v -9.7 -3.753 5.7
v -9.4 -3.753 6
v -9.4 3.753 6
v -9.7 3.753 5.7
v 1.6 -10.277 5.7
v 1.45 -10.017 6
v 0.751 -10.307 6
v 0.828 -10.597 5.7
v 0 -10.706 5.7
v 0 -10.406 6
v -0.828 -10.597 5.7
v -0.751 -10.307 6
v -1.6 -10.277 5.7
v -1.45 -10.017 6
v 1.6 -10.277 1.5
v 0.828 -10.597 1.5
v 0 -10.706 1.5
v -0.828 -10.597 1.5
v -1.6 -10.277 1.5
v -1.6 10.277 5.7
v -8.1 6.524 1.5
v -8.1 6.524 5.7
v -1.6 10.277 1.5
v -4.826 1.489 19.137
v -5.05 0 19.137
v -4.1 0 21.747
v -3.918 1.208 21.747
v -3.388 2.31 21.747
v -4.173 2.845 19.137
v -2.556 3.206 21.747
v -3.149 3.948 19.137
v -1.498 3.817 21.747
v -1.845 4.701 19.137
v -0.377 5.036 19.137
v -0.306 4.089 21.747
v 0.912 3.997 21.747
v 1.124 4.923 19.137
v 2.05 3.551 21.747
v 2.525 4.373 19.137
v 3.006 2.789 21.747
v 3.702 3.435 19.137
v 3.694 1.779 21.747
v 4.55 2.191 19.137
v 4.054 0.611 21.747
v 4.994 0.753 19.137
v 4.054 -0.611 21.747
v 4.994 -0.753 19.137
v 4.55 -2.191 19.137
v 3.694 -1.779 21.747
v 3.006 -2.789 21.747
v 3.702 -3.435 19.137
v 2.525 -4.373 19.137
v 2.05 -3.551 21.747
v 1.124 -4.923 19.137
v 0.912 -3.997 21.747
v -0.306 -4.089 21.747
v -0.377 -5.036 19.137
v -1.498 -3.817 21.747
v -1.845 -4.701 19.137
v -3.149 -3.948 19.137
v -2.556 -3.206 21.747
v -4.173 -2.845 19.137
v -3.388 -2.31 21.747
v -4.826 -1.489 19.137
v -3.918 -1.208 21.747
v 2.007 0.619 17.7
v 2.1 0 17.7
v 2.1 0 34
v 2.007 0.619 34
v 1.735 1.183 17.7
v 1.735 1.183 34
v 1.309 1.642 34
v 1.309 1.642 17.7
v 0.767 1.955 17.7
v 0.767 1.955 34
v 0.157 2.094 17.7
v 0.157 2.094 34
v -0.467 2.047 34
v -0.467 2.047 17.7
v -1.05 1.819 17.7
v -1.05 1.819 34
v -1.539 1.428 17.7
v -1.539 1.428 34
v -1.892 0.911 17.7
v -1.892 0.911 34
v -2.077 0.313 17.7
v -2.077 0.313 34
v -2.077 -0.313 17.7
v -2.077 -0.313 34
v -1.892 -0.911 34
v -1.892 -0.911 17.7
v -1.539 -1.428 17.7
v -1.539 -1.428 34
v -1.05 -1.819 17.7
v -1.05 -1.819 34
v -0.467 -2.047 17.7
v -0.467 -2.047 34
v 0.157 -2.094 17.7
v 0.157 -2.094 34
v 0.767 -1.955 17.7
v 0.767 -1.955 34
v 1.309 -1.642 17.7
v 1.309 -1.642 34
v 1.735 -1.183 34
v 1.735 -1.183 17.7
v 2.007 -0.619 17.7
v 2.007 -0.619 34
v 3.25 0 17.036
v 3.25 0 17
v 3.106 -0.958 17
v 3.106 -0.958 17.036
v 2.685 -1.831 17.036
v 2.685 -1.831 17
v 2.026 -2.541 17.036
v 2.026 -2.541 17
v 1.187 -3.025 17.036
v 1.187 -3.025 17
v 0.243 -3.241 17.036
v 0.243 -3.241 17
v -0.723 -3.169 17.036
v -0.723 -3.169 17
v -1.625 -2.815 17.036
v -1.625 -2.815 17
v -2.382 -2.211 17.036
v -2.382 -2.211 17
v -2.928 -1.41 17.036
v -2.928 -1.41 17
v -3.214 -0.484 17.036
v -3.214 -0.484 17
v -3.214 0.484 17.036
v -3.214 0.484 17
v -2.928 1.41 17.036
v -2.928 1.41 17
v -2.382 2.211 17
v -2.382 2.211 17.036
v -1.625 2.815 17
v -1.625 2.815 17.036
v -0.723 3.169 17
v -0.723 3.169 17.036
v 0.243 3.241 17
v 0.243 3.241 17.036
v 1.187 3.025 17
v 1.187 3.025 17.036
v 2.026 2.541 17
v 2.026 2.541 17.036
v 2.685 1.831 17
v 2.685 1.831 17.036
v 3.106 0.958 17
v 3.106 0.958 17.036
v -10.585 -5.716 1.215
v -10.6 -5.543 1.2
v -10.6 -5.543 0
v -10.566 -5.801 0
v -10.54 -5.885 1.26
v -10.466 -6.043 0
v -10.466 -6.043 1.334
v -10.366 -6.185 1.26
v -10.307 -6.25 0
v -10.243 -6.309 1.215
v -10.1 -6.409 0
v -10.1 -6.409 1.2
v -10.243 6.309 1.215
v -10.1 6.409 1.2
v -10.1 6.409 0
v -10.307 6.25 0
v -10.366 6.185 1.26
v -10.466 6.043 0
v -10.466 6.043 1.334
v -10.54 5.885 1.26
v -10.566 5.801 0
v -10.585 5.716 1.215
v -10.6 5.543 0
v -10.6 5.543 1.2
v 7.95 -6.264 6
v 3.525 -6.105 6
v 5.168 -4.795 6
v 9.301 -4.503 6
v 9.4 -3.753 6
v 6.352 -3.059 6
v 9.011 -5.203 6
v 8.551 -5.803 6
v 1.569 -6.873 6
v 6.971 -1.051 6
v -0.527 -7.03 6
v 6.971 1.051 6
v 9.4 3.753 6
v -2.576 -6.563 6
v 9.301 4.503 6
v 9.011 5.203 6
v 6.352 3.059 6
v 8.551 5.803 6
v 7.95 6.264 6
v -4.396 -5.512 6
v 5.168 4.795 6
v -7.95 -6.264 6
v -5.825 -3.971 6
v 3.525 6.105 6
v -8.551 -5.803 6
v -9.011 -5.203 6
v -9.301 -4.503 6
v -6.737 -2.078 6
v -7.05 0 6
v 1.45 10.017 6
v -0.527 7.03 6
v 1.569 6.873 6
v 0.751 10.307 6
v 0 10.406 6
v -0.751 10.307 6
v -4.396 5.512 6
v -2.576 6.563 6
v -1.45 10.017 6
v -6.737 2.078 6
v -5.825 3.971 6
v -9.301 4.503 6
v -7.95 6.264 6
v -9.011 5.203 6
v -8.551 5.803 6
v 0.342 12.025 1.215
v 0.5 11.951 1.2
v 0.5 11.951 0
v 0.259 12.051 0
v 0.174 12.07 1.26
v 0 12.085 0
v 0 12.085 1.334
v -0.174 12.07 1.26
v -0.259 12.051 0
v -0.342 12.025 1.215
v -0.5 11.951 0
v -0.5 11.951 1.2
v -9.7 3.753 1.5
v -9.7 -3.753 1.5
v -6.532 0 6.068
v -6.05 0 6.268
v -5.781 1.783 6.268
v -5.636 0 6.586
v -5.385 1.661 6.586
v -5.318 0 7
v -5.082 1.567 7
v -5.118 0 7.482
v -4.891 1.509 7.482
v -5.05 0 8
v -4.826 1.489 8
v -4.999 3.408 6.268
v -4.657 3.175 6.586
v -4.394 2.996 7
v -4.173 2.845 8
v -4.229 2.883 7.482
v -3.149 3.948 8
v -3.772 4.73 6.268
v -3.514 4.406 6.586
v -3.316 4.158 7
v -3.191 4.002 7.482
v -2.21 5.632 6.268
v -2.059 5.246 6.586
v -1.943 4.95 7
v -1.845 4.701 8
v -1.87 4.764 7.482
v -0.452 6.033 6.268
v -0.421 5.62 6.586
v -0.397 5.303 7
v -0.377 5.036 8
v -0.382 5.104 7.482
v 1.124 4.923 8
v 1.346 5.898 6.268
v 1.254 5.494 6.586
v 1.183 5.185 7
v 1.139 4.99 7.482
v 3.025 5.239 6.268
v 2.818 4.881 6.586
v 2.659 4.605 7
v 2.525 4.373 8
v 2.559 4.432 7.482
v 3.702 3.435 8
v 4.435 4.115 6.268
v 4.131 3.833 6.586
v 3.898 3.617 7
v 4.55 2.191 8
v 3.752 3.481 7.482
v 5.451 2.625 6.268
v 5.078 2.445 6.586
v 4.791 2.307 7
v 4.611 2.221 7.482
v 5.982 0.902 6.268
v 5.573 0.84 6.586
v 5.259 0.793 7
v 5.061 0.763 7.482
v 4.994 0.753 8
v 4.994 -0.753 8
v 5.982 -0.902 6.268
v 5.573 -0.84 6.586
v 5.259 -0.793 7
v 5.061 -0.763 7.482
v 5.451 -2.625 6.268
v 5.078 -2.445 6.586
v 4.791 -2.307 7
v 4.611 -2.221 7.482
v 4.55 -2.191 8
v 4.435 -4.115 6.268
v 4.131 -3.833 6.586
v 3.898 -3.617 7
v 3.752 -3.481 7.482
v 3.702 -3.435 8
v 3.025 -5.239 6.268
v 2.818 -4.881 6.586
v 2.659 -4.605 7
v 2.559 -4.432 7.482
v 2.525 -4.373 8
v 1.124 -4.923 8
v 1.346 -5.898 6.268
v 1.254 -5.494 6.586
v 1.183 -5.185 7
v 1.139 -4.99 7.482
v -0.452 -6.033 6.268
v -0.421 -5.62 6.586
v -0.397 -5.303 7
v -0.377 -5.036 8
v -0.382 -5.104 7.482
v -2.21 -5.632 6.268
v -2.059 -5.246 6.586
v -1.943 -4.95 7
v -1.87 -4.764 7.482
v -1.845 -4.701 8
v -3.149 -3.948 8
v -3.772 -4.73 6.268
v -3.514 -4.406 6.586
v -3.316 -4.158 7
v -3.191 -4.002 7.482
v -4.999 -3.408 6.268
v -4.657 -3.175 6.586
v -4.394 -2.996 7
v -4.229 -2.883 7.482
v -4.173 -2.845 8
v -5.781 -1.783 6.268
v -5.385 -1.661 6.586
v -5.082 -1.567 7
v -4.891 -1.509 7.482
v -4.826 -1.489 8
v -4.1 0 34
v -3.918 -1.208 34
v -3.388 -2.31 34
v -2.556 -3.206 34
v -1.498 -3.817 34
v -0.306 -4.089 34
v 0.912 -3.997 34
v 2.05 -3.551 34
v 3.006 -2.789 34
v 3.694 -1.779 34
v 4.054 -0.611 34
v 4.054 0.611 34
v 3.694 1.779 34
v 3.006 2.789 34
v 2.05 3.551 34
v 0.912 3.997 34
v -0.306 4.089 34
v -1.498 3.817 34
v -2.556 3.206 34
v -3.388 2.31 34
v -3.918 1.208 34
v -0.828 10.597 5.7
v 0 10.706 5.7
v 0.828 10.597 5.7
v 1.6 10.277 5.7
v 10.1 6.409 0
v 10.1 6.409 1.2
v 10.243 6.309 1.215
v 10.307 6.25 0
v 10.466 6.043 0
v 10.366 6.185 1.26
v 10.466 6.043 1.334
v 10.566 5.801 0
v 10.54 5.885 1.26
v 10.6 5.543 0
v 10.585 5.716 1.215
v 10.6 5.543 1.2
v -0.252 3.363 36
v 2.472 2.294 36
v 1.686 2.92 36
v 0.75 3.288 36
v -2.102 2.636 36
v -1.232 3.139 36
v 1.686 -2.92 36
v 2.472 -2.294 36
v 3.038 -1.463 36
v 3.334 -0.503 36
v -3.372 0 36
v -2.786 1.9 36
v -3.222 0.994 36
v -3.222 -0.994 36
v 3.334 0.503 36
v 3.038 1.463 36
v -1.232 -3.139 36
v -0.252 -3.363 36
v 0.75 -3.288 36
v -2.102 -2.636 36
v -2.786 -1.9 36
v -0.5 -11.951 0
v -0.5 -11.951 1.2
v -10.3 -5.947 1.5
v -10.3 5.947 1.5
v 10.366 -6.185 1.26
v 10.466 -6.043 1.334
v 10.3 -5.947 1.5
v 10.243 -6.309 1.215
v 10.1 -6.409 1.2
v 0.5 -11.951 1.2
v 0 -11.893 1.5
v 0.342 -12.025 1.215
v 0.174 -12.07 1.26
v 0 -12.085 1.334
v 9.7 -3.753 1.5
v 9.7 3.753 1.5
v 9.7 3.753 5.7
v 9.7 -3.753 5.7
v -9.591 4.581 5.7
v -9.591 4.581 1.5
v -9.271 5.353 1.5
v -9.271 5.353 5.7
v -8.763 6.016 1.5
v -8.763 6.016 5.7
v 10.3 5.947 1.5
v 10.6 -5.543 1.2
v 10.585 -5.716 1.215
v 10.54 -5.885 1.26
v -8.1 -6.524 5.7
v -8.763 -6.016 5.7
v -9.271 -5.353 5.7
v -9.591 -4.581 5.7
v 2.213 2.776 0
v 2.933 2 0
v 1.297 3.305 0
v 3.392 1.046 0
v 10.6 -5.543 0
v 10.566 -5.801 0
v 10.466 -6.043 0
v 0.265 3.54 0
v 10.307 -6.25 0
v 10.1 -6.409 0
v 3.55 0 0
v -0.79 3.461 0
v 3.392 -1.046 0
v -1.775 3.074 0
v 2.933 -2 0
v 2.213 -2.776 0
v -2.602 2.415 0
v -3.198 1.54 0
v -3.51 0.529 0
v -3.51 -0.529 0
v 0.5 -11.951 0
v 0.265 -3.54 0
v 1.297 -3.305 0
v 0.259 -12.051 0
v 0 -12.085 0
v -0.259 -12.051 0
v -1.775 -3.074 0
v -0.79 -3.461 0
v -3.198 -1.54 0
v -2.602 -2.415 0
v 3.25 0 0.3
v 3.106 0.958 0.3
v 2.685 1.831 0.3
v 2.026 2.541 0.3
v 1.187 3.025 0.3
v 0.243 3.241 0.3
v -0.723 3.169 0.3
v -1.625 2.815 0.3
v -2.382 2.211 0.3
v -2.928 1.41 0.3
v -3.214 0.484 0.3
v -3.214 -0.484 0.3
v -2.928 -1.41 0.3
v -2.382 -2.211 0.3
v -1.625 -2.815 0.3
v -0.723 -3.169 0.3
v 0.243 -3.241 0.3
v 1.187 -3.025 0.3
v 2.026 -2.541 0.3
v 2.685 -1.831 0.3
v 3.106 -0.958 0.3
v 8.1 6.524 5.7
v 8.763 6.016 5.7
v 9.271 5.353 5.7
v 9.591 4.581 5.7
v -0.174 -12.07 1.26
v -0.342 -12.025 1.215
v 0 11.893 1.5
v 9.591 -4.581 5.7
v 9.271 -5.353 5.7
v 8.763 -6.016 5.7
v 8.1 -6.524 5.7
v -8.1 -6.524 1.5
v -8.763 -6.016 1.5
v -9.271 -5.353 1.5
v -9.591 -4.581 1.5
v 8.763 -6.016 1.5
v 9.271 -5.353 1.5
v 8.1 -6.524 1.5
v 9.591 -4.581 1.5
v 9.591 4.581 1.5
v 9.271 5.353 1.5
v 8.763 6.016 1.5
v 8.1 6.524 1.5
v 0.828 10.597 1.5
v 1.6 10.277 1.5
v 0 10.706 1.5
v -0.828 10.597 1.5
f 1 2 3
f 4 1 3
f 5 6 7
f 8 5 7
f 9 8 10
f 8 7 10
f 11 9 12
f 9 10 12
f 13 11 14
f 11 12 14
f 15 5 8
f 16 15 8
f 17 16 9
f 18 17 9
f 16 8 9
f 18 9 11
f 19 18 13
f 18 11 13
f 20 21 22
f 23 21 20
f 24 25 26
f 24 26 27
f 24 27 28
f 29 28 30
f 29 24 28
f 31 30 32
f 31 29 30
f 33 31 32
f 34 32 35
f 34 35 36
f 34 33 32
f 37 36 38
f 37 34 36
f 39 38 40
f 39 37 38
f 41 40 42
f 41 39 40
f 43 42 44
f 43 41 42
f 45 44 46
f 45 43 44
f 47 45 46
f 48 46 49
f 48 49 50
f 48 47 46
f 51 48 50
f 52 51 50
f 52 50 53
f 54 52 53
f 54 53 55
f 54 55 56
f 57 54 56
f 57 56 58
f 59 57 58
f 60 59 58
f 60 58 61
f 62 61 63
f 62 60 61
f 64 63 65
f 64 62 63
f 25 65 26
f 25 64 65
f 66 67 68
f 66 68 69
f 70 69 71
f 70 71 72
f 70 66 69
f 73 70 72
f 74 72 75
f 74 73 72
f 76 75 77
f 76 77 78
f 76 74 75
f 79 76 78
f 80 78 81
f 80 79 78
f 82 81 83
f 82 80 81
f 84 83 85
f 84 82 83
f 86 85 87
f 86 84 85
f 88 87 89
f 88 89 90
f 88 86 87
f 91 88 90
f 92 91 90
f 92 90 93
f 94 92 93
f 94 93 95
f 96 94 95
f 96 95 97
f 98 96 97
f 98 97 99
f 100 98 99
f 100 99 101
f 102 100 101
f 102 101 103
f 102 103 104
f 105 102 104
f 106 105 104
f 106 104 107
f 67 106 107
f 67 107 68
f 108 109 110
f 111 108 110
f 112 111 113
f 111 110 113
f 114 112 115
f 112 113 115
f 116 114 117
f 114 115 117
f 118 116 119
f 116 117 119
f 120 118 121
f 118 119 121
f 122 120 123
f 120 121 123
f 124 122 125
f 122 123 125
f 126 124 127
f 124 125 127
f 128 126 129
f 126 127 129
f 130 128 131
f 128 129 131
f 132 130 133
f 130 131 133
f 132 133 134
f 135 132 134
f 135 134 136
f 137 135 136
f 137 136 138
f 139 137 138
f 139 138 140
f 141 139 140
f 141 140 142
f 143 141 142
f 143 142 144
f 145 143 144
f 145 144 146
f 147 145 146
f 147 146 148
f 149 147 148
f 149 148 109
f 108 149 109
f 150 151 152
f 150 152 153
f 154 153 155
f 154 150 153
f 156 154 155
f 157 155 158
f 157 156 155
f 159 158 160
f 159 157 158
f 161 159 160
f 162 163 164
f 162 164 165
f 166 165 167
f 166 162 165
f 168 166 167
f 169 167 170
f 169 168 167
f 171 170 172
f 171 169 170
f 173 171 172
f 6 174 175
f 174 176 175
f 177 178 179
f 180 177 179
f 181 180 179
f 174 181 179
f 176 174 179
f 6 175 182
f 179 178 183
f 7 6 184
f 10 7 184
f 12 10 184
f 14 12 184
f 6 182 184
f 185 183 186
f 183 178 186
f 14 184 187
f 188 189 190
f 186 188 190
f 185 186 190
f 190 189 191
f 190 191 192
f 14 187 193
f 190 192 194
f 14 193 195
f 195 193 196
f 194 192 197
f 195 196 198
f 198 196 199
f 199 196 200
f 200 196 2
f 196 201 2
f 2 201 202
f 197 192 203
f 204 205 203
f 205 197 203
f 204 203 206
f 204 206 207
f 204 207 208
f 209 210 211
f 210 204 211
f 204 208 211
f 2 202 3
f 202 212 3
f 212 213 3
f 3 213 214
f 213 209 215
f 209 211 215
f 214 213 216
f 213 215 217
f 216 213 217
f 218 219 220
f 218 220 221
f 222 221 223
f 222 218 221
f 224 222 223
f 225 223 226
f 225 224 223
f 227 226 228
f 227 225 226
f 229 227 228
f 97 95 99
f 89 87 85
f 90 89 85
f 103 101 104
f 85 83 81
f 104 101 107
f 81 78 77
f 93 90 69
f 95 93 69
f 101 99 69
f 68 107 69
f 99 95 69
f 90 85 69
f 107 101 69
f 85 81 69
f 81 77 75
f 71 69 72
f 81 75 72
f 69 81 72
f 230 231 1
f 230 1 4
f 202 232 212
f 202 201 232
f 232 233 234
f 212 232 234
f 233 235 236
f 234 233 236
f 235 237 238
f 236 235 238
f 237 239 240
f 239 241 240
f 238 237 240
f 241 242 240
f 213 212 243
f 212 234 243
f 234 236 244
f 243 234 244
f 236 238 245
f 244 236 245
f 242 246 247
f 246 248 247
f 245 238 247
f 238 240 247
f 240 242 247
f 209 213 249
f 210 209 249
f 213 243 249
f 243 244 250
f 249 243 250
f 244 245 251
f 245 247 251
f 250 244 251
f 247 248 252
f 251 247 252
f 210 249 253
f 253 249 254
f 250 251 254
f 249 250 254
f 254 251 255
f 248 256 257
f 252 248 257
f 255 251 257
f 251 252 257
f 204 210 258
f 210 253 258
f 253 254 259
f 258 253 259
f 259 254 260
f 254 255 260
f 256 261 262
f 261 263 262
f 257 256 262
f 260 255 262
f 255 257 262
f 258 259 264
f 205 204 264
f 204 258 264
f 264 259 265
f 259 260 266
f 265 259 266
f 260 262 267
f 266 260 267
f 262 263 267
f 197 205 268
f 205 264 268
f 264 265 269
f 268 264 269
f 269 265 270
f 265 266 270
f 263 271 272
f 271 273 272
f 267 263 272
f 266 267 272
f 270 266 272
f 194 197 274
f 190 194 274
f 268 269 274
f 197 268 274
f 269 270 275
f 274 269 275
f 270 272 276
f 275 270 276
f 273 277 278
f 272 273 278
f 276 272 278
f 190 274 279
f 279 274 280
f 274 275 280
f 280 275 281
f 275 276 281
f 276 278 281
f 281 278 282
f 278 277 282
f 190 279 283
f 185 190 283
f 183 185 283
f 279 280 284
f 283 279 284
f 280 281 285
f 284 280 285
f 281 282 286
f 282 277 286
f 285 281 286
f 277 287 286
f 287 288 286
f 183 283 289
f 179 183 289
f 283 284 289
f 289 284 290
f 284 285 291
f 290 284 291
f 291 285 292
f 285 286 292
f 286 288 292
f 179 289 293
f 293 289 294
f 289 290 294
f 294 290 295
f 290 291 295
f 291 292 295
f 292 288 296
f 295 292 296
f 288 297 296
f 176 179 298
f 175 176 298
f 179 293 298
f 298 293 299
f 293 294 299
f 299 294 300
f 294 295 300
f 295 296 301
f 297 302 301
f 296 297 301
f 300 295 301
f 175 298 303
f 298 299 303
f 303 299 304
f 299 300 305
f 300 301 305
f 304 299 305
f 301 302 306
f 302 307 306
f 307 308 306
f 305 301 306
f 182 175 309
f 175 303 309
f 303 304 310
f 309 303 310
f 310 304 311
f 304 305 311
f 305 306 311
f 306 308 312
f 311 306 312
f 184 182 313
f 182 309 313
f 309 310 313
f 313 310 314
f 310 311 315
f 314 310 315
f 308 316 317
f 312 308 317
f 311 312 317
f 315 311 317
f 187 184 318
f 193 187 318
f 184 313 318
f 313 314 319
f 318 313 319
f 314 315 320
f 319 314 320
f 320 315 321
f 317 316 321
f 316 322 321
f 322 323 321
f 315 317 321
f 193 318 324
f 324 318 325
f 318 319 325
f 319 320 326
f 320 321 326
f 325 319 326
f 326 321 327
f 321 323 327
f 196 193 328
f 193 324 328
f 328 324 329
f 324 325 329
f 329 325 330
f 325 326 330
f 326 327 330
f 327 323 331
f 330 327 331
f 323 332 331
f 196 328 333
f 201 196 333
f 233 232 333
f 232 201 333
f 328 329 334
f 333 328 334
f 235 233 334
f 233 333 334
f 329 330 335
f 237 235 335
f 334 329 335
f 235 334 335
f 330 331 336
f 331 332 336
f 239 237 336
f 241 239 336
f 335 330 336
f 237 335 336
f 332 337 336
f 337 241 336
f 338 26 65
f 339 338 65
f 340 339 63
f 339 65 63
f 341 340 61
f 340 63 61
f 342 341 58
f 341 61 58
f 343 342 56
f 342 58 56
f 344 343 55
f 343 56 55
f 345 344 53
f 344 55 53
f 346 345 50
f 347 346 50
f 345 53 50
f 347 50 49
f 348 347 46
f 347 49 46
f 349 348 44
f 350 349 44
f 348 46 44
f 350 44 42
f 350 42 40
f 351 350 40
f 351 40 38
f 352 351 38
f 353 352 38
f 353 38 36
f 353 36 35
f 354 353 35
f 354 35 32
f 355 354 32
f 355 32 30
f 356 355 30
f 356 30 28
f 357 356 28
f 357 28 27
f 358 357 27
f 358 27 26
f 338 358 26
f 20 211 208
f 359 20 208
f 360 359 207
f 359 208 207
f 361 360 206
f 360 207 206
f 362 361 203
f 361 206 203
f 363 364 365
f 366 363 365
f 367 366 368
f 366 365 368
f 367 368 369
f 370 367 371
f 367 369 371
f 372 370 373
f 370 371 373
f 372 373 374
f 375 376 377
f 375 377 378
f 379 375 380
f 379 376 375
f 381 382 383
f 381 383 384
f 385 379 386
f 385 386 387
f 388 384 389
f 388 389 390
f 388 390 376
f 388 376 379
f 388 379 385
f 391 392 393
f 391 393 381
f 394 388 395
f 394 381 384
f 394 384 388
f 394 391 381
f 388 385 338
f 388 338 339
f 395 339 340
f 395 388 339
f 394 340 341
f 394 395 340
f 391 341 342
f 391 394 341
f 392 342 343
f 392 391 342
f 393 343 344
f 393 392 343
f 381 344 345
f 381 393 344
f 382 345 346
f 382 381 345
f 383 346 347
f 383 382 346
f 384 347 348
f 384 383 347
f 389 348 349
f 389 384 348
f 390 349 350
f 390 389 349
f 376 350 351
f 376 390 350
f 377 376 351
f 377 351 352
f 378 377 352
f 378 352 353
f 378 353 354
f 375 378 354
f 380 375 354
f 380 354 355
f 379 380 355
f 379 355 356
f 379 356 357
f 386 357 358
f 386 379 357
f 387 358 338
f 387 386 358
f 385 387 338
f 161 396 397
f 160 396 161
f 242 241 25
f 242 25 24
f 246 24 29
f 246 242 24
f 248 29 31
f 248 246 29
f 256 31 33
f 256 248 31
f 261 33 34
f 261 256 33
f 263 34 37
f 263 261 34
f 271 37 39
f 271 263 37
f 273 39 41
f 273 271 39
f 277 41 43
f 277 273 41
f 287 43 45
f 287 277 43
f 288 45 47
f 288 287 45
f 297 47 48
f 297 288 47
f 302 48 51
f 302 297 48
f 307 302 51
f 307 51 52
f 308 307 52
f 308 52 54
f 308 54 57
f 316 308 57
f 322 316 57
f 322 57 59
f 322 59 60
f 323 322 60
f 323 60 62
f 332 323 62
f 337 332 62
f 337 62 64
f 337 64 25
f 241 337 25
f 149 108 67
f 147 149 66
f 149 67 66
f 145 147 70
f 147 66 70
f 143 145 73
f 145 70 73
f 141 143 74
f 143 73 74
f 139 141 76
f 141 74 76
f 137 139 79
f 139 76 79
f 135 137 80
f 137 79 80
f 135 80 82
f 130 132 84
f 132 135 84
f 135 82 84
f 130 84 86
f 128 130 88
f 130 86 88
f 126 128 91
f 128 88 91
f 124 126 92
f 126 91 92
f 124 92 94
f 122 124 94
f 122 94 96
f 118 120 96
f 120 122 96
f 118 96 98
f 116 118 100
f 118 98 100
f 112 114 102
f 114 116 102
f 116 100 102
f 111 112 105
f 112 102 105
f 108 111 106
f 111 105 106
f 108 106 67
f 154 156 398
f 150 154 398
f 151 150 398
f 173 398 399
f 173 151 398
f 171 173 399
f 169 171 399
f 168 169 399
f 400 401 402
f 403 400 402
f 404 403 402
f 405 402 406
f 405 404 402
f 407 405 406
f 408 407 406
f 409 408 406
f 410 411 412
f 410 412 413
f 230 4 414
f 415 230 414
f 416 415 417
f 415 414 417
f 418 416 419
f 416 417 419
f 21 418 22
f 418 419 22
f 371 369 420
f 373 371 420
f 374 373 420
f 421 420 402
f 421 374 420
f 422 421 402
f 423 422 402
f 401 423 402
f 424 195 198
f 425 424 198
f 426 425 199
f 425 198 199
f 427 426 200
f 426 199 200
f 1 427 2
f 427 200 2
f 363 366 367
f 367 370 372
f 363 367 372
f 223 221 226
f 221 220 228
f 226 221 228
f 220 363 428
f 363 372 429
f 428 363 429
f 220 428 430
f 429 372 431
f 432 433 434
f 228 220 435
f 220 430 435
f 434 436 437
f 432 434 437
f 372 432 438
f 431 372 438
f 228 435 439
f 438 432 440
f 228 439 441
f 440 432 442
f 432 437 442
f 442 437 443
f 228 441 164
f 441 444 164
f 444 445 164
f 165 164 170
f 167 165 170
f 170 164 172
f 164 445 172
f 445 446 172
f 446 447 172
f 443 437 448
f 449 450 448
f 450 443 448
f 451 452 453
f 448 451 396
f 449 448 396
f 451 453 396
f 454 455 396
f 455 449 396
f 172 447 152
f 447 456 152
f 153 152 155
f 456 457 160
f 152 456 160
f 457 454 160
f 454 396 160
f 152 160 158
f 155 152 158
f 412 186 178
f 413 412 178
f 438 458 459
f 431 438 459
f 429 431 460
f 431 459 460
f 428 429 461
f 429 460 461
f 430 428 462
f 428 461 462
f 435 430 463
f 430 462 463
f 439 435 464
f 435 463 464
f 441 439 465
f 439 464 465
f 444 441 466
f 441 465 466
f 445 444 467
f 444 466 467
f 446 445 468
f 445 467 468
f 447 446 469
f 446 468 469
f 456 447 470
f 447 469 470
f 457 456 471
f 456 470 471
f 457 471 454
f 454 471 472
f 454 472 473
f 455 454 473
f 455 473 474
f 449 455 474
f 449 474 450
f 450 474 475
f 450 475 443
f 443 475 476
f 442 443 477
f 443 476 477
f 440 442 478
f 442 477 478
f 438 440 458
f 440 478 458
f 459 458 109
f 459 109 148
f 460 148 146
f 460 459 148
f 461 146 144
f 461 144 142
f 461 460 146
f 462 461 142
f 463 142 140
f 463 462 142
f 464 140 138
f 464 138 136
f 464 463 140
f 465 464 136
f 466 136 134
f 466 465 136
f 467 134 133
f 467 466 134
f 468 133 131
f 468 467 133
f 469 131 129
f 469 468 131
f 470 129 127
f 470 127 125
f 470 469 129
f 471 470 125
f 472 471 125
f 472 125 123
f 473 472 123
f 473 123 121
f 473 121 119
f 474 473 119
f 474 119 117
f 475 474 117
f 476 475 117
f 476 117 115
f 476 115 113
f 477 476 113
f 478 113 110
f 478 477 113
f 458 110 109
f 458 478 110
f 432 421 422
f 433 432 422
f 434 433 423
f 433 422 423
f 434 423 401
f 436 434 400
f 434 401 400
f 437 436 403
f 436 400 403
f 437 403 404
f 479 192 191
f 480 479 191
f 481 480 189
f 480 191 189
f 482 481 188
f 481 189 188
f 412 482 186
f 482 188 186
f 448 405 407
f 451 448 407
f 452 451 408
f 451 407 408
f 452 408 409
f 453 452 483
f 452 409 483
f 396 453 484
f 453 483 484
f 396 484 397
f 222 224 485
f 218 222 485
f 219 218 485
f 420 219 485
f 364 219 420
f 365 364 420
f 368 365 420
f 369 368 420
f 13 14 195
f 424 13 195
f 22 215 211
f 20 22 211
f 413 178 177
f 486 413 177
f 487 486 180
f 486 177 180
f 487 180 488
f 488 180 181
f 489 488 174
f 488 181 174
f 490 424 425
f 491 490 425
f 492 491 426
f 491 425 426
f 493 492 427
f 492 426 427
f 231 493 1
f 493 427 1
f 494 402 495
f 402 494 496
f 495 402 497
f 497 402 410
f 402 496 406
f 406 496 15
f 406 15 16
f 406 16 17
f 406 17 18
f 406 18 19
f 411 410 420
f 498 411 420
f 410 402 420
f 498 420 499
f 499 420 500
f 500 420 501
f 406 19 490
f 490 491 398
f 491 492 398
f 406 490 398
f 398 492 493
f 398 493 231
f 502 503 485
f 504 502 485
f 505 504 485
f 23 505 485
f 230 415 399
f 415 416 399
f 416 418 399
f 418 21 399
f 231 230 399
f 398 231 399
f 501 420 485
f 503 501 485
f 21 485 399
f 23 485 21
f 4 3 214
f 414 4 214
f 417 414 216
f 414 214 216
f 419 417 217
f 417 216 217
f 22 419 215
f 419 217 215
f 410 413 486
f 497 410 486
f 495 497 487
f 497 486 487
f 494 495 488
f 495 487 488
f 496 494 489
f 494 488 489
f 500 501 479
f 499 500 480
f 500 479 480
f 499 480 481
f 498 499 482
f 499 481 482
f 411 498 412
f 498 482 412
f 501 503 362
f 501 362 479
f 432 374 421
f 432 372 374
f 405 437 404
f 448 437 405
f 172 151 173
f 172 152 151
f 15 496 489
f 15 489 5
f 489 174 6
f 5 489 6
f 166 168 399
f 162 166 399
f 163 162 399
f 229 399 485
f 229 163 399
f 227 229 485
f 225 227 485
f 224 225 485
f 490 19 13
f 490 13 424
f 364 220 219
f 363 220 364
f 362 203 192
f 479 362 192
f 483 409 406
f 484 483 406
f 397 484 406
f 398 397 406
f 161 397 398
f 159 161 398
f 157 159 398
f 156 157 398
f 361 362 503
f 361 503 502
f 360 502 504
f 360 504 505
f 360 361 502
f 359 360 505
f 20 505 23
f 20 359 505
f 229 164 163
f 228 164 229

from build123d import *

# Parameters (mm, degrees)
BOSS_EXTRUDE1_DEPTH  = 1.5
SKETCH1_8_R          = 4.1
BOSS_EXTRUDE3_DEPTH  = 36
SKETCH1_9_R          = 5.05
BOSS_EXTRUDE4_DEPTH  = 19
SHELL1_START         = 2
SHELL1_OUTLINE_R     = 2.1
SHELL1_DEPTH         = 32
SHELL1_2_OUTLINE_R   = 3.05
SHELL1_2_OUTLINE_R_2 = 2.1
SHELL1_2_DEPTH       = 15
SKETCH1_10_R         = 3.25
CUT_EXTRUDE1_DEPTH   = 17
SKETCH1_3_R          = 3.25
BOSS_EXTRUDE2_DEPTH  = 6
CHAMFER1_SIZE        = 2
CHAMFER1_SIZE2       = 0.727940469
CHAMFER2_SIZE        = 2.747477419
CHAMFER2_SIZE_2      = 1
CHAMFER3_SIZE        = 1.212435565
CHAMFER3_SIZE_2      = 0.7
CHAMFER6_SIZE        = 0.3
FILLET1_R            = 3.2
CHAMFER5_SIZE        = 0.3
FILLET2_R            = 1
FILLET3_R            = 2


# Read off the part's stored shape, not the designer's step: Shell1
with BuildPart() as part:
    # Sketch1 → Boss-Extrude1 (new body)
    with BuildSketch(Plane.XY):
        Polygon((-10.6, 6.119912853), (0, 12.239825707), (10.6, 6.119912853), (10.6, -6.119912853), (0, -12.239825707), (-10.6, -6.119912853), align=None)
    extrude(amount=BOSS_EXTRUDE1_DEPTH)

    # Sketch1<8> → Boss-Extrude3 (add)
    with BuildSketch(Plane.XY):
        with Locations(Location((0, 0, 0), (0, 0, 180))):
            Circle(SKETCH1_8_R)
    extrude(amount=BOSS_EXTRUDE3_DEPTH)

    # Sketch1<9> → Boss-Extrude4 (add)
    with BuildSketch(Plane.XY):
        with Locations(Location((0, 0, 0), (0, 0, 180))):
            Circle(SKETCH1_9_R)
    extrude(amount=BOSS_EXTRUDE4_DEPTH)

    # Shell1 outline → Shell1 (cut)
    with BuildSketch(Plane.XY.offset(SHELL1_START)):
        Circle(SHELL1_OUTLINE_R)
    extrude(amount=SHELL1_DEPTH, mode=Mode.SUBTRACT)

    # Shell1 2 outline → Shell1 2 (cut)
    with BuildSketch(Plane.XY.offset(SHELL1_START)):
        Circle(SHELL1_2_OUTLINE_R)
        Circle(SHELL1_2_OUTLINE_R_2, mode=Mode.SUBTRACT)
    extrude(amount=SHELL1_2_DEPTH, mode=Mode.SUBTRACT)

    # Sketch1<10> → Cut-Extrude1 (cut)
    with BuildSketch(Plane.XY):
        Circle(SKETCH1_10_R)
    extrude(amount=CUT_EXTRUDE1_DEPTH, mode=Mode.SUBTRACT)

    # Sketch1<3> → Boss-Extrude2 (add)
    with BuildSketch(Plane.XY):
        Polygon((0, 11.200595222), (9.7, 5.600297611), (9.7, -5.600297611), (0, -11.200595222), (-9.7, -5.600297611), (-9.7, 5.600297611), align=None)
        Circle(SKETCH1_3_R, mode=Mode.SUBTRACT)
    extrude(amount=BOSS_EXTRUDE2_DEPTH)

    # Chamfer1
    chamfer1_edges = [part.edges().sort_by_distance(p)[0] for p in [
        (4.1, 0, 36),
    ]]
    chamfer1_side = [part.faces().sort_by_distance(p)[0] for p in [
        (4.1, 0, 27.5),
    ]]
    chamfer(chamfer1_edges, length=CHAMFER1_SIZE, length2=CHAMFER1_SIZE2, reference=chamfer1_side[0])

    # Chamfer2
    # the kernel refuses this chamfer: 2.747477419, 1 mm, written as the material it adds along each edge
    with BuildSketch(Plane(origin=(0, 0, 19), x_dir=(-1, 0, 0), z_dir=(0, -1, 0))) as chamfer2_piece_1_section:
        Polygon((4.1, -CHAMFER2_SIZE), (4.1 + CHAMFER2_SIZE_2, 0), (4.1, 0), align=None)
    chamfer2_piece_1 = revolve(axis=Axis((0, 0, 19), (0, 0, -1)), mode=Mode.PRIVATE)
    chamfer2_piece_1 = chamfer2_piece_1 & Plane(origin=(0, 0, 20.481947897), x_dir=(-1, 0, 0), z_dir=(0, 0, -1)) * Cylinder(5.05, 21, mode=Mode.PRIVATE)
    add(chamfer2_piece_1)

    # Chamfer3
    # the kernel refuses this chamfer: 1.212435565, 0.7 mm, written as the material it takes off along each edge
    with BuildSketch(Plane(origin=(0, 0, 17), x_dir=(1, 0, 0), z_dir=(0, -1, 0))) as chamfer3_piece_1_section:
        Polygon((2.1 + CHAMFER3_SIZE, 0), (2.1, CHAMFER3_SIZE_2), (2.1, 0), align=None)
    chamfer3_piece_1 = revolve(axis=Axis((0, 0, 17), (0, 0, 1)), mode=Mode.PRIVATE)
    chamfer3_piece_1 = chamfer3_piece_1 & Plane(origin=(0, 0, 17.363214185), x_dir=(1, 0, 0), z_dir=(0, 0, -1)) * Cylinder(3.25, 14, mode=Mode.PRIVATE)
    add(chamfer3_piece_1, mode=Mode.SUBTRACT)

    # Chamfer6
    chamfer6_edges = [part.edges().sort_by_distance(p)[0] for p in [
        (-3.25, 0, 0),
    ]]
    chamfer(chamfer6_edges, length=CHAMFER6_SIZE)

    # Fillet1
    fillet1_edges = [part.edges().sort_by_distance(p)[0] for p in [
        (-9.7, -5.600297611, 3.75),
        (0, -11.200595222, 3.75),
        (9.7, -5.600297611, 3.75),
        (9.7, 5.600297611, 3.75),
        (0, 11.200595222, 3.75),
        (-9.7, 5.600297611, 3.75),
    ]]
    fillet(fillet1_edges, radius=FILLET1_R)

    # Chamfer5
    chamfer5_edges = [part.edges().sort_by_distance(p)[0] for p in [
        (-4.85, -8.400446417, 6),
        (4.85, 8.400446417, 6),
        (-4.85, 8.400446417, 6),
        (-9.7, 0, 6),
        (9.271281292, 5.35277675, 6),
        (0, 10.705553499, 6),
        (-9.271281292, 5.35277675, 6),
        (-9.271281292, -5.35277675, 6),
        (0, -10.705553499, 6),
        (9.271281292, -5.35277675, 6),
        (5.3, 9.17986928, 1.5),
        (10.6, 0, 1.5),
        (5.3, -9.17986928, 1.5),
        (-5.3, -9.17986928, 1.5),
        (-10.6, 0, 1.5),
        (-5.3, 9.17986928, 1.5),
        (9.7, 0, 6),
        (4.85, -8.400446417, 6),
    ]]
    chamfer(chamfer5_edges, length=CHAMFER5_SIZE)

    # Fillet2
    fillet2_edges = [part.edges().sort_by_distance(p)[0] for p in [
        (10.6, 6.119912853, 0.6),
        (10.6, -6.119912853, 0.6),
        (0, -12.239825707, 0.6),
        (-10.6, -6.119912853, 0.6),
        (-10.6, 6.119912853, 0.6),
        (0, 12.239825707, 0.6),
    ]]
    fillet(fillet2_edges, radius=FILLET2_R)

    # Fillet3
    fillet3_edges = [part.edges().sort_by_distance(p)[0] for p in [
        (5.05, 0, 6),
    ]]
    fillet(fillet3_edges, radius=FILLET3_R)


solid = part.part
